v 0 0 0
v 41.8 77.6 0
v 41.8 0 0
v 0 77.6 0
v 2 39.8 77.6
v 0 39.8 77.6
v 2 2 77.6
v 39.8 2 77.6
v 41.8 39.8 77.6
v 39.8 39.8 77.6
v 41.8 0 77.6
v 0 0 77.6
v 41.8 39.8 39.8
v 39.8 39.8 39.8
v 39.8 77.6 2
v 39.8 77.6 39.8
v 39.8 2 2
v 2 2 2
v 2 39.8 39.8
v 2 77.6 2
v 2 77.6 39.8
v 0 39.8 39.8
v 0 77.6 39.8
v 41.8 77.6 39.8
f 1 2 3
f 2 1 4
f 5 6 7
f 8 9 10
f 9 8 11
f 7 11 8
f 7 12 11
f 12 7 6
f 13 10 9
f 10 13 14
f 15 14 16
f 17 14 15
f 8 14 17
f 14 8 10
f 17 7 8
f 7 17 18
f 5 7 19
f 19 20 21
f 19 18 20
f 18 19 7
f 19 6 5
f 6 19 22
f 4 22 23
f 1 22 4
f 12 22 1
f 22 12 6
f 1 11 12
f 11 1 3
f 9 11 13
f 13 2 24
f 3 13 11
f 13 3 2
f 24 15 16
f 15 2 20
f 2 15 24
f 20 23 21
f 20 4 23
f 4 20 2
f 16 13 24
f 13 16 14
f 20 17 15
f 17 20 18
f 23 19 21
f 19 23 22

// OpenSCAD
innerWidth = 37.8;
innerHeight = 37.8;
wallWidth = 2;

module channel() {
    points = [
        [0,0],
        [0,innerHeight + wallWidth],
        [wallWidth, innerHeight + wallWidth],
        [wallWidth, wallWidth],
        [wallWidth + innerWidth, wallWidth],
        [wallWidth + innerWidth, innerHeight + wallWidth],
        [wallWidth + innerWidth + wallWidth, innerHeight + wallWidth],
        [wallWidth + innerWidth + wallWidth, 0]
    ];

    linear_extrude(height = 2 * innerWidth + wallWidth)
        polygon(points);
}

channel();
mirror([0, -1, 1])
    channel();
